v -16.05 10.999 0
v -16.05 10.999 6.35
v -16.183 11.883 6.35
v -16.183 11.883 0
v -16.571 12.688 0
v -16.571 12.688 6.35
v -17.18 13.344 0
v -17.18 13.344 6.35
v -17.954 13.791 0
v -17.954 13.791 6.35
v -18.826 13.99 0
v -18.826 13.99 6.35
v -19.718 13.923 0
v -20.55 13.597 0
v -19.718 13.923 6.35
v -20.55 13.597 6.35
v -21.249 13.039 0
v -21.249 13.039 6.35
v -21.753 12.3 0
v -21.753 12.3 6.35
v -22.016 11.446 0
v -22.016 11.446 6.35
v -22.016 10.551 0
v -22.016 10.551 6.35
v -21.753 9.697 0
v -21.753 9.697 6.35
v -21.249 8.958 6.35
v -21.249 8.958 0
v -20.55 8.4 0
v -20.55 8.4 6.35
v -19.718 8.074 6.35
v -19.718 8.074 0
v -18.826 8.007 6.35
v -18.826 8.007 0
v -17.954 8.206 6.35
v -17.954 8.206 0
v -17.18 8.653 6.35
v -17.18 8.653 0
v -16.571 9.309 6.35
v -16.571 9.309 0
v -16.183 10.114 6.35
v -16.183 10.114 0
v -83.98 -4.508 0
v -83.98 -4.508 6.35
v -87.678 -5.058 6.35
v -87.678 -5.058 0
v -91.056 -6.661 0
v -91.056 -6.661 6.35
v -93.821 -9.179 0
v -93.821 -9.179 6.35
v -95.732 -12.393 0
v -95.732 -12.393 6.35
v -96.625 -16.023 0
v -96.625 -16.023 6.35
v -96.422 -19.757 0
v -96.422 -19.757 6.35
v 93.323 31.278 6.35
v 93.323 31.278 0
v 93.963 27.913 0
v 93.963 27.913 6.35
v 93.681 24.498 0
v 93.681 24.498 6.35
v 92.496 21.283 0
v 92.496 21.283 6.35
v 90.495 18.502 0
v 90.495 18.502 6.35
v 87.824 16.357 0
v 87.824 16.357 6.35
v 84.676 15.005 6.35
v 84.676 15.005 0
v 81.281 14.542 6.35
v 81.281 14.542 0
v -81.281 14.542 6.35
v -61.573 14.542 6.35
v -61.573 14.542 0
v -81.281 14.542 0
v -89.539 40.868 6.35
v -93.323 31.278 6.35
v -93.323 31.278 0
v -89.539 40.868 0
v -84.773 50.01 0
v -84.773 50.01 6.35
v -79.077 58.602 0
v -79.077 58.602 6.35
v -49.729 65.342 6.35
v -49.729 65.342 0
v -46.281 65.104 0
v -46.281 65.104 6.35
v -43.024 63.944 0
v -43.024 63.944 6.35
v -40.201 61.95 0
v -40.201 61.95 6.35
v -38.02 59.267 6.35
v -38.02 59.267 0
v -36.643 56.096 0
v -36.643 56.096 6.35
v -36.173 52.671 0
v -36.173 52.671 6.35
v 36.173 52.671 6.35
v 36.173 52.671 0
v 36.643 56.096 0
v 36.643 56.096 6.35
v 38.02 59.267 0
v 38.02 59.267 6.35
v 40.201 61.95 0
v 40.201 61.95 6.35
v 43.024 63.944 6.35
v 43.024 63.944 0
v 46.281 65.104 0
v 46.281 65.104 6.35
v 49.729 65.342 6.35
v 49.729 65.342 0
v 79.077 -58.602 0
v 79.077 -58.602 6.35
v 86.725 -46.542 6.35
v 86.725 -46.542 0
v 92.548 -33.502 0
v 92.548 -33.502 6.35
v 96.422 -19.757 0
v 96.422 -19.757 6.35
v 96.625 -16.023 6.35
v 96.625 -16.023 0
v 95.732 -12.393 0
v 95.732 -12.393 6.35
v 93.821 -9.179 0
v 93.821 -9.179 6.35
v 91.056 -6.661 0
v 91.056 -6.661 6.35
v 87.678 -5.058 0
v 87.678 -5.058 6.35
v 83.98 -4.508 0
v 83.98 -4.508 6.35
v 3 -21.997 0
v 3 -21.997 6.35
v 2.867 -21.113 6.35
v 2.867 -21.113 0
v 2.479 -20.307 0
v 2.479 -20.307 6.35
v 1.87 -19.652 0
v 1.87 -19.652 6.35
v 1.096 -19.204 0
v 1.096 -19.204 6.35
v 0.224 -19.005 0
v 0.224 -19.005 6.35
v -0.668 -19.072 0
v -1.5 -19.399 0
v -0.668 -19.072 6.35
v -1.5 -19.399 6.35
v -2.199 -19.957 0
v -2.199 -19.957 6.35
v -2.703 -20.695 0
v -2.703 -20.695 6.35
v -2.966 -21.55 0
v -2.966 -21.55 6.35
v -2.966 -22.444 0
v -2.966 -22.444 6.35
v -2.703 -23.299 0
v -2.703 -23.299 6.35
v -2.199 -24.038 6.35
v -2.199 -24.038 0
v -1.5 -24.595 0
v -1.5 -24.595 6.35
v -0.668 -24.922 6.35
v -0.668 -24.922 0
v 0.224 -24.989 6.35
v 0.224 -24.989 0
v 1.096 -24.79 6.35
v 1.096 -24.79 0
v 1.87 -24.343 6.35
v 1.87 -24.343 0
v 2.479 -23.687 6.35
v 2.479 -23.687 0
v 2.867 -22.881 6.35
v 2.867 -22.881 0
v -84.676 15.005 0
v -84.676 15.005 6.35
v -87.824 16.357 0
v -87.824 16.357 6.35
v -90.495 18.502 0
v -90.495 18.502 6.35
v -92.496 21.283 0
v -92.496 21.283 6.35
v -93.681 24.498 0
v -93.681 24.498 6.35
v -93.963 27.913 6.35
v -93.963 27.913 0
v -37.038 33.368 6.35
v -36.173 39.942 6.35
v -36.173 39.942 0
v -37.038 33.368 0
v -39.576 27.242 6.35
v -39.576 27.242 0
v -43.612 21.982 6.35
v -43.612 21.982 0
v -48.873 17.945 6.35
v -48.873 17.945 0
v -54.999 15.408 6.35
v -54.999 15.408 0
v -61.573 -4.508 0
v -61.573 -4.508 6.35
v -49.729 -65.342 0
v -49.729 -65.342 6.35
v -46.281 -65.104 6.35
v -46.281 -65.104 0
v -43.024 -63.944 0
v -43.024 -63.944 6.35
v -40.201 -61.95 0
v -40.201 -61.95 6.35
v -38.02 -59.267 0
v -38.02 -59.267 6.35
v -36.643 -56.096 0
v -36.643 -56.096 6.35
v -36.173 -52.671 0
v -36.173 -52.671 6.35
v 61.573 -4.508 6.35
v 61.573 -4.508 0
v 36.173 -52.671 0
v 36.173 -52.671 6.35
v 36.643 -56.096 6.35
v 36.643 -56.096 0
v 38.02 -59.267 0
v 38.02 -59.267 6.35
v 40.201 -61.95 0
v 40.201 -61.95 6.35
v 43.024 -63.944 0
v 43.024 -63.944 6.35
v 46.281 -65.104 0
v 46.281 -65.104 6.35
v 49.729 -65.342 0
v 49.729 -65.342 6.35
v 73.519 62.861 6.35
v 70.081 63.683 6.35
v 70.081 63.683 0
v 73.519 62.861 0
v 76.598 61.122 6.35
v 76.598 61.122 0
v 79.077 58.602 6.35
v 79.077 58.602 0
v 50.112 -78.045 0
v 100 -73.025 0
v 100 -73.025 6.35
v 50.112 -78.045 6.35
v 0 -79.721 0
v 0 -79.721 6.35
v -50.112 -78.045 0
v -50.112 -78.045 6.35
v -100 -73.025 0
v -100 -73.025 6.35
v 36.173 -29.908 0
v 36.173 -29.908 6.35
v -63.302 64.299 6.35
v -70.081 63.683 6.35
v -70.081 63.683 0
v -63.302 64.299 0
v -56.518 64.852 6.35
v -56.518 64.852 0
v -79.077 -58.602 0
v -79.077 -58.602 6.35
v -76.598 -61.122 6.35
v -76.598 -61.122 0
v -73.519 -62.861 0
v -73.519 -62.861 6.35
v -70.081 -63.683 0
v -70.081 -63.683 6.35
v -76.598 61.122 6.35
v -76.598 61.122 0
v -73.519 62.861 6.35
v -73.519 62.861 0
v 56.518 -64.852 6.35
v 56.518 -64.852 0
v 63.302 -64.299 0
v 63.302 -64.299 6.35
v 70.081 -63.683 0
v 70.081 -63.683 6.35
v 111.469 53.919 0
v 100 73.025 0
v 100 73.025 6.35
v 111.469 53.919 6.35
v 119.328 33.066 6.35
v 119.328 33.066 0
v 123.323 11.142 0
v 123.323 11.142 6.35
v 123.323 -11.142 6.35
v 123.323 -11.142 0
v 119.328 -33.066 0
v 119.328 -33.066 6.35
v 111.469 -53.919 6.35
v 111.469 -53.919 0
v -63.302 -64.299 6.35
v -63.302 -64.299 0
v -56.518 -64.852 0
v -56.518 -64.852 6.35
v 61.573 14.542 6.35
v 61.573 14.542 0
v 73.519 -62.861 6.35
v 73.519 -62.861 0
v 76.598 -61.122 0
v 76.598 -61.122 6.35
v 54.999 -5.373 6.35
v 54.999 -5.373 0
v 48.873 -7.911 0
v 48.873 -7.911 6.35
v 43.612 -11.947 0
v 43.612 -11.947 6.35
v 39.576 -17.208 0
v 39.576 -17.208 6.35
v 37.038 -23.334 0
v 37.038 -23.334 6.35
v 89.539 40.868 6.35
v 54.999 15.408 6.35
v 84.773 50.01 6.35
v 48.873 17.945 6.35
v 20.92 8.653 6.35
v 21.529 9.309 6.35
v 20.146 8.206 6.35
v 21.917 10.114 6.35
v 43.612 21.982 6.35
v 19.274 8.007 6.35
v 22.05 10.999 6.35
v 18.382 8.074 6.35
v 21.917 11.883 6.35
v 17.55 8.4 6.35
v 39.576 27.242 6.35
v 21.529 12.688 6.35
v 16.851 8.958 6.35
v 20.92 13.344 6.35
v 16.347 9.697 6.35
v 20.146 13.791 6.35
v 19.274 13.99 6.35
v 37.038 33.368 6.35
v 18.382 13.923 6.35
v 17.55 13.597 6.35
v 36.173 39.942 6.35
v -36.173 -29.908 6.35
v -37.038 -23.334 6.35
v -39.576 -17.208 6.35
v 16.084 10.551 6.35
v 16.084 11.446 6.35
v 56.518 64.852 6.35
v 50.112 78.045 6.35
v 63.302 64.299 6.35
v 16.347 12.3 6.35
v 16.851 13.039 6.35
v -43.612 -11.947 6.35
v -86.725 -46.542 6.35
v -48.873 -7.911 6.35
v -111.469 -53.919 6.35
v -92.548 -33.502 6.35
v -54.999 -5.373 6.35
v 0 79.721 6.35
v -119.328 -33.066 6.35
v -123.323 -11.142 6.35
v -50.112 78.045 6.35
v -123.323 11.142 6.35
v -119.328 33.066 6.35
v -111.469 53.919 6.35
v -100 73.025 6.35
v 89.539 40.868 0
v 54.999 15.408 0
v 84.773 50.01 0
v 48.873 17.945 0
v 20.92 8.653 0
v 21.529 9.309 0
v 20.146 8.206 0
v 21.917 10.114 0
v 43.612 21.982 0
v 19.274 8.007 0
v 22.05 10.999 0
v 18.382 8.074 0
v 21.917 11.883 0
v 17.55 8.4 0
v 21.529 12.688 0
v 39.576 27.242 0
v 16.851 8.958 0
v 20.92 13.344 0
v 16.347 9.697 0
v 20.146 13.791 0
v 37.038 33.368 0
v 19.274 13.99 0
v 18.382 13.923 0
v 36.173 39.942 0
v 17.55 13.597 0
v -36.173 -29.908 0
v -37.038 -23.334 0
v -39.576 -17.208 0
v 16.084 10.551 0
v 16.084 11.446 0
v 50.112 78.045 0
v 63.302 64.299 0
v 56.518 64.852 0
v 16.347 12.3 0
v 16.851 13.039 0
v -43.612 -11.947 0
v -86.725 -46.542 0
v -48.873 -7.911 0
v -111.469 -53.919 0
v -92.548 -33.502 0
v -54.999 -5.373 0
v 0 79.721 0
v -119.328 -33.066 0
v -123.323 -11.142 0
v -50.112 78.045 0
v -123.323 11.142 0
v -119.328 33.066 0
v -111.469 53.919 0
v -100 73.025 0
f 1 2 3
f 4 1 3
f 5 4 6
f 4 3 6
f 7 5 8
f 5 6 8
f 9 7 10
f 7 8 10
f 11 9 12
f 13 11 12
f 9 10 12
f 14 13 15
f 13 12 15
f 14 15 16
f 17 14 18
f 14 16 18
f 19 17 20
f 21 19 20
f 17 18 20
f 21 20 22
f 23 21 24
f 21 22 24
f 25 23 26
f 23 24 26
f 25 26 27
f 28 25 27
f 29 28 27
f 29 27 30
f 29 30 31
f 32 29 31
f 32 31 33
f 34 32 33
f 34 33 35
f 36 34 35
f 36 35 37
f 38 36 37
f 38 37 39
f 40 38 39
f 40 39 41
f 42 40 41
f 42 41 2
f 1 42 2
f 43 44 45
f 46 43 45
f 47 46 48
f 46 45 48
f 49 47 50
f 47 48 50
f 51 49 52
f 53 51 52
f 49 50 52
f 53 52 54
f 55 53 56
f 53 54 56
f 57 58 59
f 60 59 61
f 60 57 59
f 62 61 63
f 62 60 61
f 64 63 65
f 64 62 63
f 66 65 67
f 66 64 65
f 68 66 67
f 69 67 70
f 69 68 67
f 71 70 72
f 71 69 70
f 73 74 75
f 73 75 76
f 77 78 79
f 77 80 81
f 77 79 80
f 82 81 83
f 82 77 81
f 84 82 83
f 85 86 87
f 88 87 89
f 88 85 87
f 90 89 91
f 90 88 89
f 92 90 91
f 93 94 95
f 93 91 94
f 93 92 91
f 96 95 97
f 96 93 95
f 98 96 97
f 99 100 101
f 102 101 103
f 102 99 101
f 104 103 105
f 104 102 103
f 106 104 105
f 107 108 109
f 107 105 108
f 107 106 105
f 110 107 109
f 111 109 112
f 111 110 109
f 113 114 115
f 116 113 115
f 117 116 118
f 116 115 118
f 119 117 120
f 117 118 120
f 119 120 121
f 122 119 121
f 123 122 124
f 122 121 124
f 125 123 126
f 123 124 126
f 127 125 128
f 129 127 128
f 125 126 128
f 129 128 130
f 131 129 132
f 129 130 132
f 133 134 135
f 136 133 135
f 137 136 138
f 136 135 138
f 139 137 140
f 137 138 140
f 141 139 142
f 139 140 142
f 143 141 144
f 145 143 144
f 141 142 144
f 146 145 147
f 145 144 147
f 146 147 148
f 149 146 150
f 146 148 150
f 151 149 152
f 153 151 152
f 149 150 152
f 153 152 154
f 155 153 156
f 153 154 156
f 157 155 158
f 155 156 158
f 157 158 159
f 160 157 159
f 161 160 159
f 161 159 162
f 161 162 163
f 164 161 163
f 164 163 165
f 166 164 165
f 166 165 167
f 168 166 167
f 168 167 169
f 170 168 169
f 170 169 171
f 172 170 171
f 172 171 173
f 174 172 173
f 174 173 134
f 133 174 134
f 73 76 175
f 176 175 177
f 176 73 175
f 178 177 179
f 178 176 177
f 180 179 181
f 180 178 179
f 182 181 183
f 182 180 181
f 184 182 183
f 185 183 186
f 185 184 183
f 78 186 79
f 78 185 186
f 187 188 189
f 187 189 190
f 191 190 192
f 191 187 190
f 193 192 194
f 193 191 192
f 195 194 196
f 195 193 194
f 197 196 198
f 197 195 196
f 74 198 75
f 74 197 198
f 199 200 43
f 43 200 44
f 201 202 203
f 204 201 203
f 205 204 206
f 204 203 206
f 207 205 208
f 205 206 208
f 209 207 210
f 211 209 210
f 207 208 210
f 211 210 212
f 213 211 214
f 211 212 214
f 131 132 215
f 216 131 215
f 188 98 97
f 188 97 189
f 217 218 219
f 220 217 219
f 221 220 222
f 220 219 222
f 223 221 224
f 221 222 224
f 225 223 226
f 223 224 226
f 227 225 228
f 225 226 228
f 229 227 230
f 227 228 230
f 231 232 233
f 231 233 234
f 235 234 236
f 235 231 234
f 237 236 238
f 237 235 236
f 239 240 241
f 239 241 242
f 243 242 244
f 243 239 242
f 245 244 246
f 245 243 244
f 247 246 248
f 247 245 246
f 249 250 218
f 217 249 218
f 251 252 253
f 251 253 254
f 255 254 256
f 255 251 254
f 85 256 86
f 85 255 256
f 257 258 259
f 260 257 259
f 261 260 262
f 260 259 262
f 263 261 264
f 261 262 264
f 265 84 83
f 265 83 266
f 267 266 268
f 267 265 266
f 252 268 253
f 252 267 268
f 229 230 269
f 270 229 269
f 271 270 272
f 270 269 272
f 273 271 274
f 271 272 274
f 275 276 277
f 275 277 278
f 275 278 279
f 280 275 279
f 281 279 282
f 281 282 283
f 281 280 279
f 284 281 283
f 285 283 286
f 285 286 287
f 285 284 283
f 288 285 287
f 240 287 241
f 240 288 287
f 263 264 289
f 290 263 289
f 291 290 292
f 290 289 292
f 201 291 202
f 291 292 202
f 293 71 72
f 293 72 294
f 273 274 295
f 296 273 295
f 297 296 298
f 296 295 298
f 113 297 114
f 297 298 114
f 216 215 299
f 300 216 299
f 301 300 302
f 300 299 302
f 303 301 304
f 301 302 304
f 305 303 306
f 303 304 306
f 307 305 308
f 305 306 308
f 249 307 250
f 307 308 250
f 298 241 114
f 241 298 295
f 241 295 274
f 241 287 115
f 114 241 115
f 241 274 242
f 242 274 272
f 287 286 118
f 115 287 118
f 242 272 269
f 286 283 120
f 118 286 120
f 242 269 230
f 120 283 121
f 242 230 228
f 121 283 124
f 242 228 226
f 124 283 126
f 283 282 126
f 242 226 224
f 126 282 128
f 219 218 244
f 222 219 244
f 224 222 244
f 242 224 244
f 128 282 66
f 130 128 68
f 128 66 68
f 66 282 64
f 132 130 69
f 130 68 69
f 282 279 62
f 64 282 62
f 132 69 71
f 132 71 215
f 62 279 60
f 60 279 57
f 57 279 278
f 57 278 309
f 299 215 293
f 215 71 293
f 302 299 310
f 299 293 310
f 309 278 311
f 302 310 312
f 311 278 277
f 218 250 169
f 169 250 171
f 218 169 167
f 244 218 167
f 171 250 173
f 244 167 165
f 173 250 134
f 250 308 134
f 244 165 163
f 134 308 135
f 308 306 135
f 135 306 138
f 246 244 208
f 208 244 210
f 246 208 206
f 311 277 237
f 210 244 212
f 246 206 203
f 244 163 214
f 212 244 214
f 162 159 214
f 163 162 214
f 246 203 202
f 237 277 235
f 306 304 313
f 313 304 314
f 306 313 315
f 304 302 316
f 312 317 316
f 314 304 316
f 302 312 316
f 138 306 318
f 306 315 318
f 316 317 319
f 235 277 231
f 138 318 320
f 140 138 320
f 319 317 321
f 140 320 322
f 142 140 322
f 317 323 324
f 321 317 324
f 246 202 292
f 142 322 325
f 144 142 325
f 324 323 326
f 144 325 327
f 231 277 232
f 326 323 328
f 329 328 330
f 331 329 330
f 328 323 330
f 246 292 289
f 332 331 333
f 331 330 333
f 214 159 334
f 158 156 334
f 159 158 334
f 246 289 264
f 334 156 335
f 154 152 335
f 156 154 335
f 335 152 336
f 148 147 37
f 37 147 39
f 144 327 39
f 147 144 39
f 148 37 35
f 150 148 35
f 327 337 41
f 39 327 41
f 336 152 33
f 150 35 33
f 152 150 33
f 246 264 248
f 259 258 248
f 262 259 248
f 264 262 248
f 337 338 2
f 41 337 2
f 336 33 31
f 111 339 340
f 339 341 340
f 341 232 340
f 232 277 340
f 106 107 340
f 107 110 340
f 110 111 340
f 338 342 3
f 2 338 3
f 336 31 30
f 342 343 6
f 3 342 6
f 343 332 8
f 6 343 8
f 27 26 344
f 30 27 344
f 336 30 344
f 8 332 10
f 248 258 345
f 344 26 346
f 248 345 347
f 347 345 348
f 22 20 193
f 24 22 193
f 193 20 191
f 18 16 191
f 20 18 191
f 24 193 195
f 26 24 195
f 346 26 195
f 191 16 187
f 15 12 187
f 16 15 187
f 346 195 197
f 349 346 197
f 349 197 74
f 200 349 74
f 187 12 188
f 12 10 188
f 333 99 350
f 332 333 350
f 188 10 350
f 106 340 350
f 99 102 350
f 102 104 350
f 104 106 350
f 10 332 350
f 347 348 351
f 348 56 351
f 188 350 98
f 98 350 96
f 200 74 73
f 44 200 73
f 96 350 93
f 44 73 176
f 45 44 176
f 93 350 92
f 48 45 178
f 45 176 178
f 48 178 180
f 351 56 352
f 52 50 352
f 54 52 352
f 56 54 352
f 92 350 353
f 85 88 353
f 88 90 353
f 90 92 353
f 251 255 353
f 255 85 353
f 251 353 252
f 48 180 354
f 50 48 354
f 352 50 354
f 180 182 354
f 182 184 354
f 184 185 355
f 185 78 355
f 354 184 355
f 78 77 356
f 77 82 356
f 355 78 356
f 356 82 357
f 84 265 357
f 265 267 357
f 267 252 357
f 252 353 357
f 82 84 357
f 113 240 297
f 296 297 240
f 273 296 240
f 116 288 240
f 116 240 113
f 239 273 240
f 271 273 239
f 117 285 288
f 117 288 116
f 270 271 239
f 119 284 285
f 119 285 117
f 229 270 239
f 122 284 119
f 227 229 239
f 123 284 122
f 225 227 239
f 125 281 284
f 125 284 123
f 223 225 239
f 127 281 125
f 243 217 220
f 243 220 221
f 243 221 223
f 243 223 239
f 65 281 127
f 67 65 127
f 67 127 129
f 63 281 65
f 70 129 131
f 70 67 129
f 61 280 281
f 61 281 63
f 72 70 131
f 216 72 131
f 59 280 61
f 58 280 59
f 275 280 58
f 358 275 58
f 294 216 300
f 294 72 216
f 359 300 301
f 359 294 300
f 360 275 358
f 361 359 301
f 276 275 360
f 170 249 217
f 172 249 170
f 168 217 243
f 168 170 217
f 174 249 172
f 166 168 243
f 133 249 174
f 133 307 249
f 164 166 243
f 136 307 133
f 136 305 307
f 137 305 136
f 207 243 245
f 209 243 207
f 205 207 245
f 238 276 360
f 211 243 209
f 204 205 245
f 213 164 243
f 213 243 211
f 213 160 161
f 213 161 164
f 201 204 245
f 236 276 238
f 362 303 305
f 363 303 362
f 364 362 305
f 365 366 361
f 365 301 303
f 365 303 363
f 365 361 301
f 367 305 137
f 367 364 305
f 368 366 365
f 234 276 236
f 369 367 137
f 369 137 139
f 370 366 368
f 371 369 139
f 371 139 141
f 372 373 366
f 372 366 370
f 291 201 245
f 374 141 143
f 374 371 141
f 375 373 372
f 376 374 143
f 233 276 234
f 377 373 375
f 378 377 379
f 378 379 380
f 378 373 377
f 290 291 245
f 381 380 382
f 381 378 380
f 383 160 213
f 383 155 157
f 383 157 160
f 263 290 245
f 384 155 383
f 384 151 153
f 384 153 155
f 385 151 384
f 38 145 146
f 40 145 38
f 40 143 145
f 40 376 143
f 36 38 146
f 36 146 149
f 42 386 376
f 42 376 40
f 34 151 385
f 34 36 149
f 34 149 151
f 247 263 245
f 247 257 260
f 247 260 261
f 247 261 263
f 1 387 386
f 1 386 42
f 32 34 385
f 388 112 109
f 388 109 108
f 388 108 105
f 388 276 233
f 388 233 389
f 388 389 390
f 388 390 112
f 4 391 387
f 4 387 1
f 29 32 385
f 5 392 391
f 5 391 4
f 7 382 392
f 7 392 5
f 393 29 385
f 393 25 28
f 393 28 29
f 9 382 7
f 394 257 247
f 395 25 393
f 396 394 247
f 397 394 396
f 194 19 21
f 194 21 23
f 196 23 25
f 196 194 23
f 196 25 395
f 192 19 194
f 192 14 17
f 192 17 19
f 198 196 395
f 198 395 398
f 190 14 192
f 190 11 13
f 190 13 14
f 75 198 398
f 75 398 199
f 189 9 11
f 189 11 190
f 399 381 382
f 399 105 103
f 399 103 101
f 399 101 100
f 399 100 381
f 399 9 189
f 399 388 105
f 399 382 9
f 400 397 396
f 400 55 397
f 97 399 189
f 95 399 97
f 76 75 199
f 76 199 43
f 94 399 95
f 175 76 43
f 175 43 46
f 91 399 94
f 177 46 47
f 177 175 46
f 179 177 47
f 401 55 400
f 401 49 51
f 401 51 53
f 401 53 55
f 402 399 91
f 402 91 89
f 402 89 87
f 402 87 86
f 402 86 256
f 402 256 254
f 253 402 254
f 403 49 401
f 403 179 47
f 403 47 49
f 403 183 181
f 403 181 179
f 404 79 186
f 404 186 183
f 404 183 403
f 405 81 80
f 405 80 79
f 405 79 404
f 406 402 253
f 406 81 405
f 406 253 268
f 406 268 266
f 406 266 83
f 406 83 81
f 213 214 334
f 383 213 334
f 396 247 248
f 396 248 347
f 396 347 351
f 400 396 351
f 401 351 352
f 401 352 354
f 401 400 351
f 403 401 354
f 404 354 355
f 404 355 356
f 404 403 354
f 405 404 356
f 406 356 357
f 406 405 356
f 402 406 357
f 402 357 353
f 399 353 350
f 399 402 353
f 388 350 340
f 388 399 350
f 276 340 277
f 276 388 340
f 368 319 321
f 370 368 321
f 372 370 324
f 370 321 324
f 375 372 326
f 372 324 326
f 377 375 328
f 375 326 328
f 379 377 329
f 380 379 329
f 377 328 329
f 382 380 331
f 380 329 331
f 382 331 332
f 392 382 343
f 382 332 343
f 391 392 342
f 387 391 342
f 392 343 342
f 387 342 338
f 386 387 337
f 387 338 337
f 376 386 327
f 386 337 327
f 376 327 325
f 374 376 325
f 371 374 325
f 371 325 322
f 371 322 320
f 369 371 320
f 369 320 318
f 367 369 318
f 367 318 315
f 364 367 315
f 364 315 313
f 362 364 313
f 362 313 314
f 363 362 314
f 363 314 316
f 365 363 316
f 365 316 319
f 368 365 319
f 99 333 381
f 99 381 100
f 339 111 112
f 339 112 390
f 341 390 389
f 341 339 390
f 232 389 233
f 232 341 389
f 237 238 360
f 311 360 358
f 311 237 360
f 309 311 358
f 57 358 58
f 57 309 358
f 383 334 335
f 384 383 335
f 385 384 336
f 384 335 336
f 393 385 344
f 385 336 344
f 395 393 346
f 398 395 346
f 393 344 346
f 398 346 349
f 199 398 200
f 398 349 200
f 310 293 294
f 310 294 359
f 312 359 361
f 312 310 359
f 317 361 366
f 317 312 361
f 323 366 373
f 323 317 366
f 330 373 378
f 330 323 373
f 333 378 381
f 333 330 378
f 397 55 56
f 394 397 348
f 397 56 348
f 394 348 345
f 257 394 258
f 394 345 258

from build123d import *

# Parameters (mm, degrees)
BOSS_EXTRUDE1_DEPTH = 6.35
CUT_EXTRUDE1_DEPTH  = 7.35
SKETCH4_R           = 3
CUT_EXTRUDE2_DEPTH  = 7.35


with BuildPart() as part:
    # Sketch2 → Boss-Extrude1 (new body)
    with BuildSketch(Plane.XY):
        with BuildLine():
            ThreePointArc((-100, 73.02486306), (0, 79.721425695), (100, 73.02486306))
            ThreePointArc((100, 73.02486306), (123.825, 0), (100, -73.02486306))
            ThreePointArc((100, -73.02486306), (0, -79.721425695), (-100, -73.02486306))
            ThreePointArc((-100, -73.02486306), (-123.825, 0), (-100, 73.02486306))
        make_face()
    extrude(amount=BOSS_EXTRUDE1_DEPTH)

    # Sketch3 → Cut-Extrude1 (cut, through all)
    with BuildSketch(Plane.XY.offset(6.35)):
        with BuildLine():
            Line((-61.572799723, 14.542440806), (-81.281148146, 14.542440806))
            ThreePointArc((-81.281148146, 14.542440806), (-91.5900314, 19.825101253), (-93.322799723, 31.278357963))
            ThreePointArc((-93.322799723, 31.278357963), (-87.27608067, 45.501278749), (-79.077484693, 58.602321112))
            ThreePointArc((-79.077484693, 58.602321112), (-75.119328128, 62.098990903), (-70.081085695, 63.683230851))
            ThreePointArc((-70.081085695, 63.683230851), (-59.910981492, 64.583293189), (-49.729388954, 65.342440806))
            ThreePointArc((-49.729388954, 65.342440806), (-40.200680121, 61.949526114), (-36.172799723, 52.671361338))
            Line((-36.172799723, 52.671361338), (-36.172799723, 39.942440806))
            ThreePointArc((-36.172799723, 39.942440806), (-43.612287481, 21.981928564), (-61.572799723, 14.542440806))
        make_face()
        with BuildLine():
            Line((36.172799723, -29.907559194), (36.172799723, -52.671361338))
            ThreePointArc((36.172799723, -52.671361338), (40.200680121, -61.949526114), (49.729388954, -65.342440806))
            ThreePointArc((49.729388954, -65.342440806), (59.910981492, -64.583293189), (70.081085695, -63.683230851))
            ThreePointArc((70.081085695, -63.683230851), (75.119328128, -62.098990903), (79.077484693, -58.602321112))
            ThreePointArc((79.077484693, -58.602321112), (89.8734441, -40.12785405), (96.421721635, -19.756827222))
            ThreePointArc((96.421721635, -19.756827222), (93.820577654, -9.179038283), (83.980209166, -4.507559194))
            Line((83.980209166, -4.507559194), (61.572799723, -4.507559194))
            ThreePointArc((61.572799723, -4.507559194), (43.612287481, -11.947046951), (36.172799723, -29.907559194))
        make_face()
        with BuildLine():
            Line((-61.572799723, -4.507559194), (-83.980209166, -4.507559194))
            ThreePointArc((-83.980209166, -4.507559194), (-93.820577654, -9.179038283), (-96.421721635, -19.756827222))
            ThreePointArc((-96.421721635, -19.756827222), (-89.8734441, -40.12785405), (-79.077484693, -58.602321112))
            ThreePointArc((-79.077484693, -58.602321112), (-75.119328128, -62.098990903), (-70.081085695, -63.683230851))
            ThreePointArc((-70.081085695, -63.683230851), (-59.910981492, -64.583293189), (-49.729388954, -65.342440806))
            ThreePointArc((-49.729388954, -65.342440806), (-40.200680121, -61.949526114), (-36.172799723, -52.671361338))
            Line((-36.172799723, -52.671361338), (-36.172799723, -29.907559194))
            ThreePointArc((-36.172799723, -29.907559194), (-43.612287481, -11.947046951), (-61.572799723, -4.507559194))
        make_face()
        with BuildLine():
            Line((36.172799723, 39.942440806), (36.172799723, 52.671361338))
            ThreePointArc((36.172799723, 52.671361338), (40.200680121, 61.949526114), (49.729388954, 65.342440806))
            ThreePointArc((49.729388954, 65.342440806), (59.910981492, 64.583293189), (70.081085695, 63.683230851))
            ThreePointArc((70.081085695, 63.683230851), (75.119328128, 62.098990903), (79.077484693, 58.602321112))
            ThreePointArc((79.077484693, 58.602321112), (87.27608067, 45.501278749), (93.322799723, 31.278357963))
            ThreePointArc((93.322799723, 31.278357963), (91.5900314, 19.825101253), (81.281148146, 14.542440806))
            Line((81.281148146, 14.542440806), (61.572799723, 14.542440806))
            ThreePointArc((61.572799723, 14.542440806), (43.612287481, 21.981928564), (36.172799723, 39.942440806))
        make_face()
    extrude(amount=-CUT_EXTRUDE1_DEPTH, mode=Mode.SUBTRACT)

    # Sketch4 → Cut-Extrude2 (cut, through all)
    with BuildSketch(Plane.XY.offset(6.35)):
        with Locations((-19.05, 10.998522628)):
            Circle(SKETCH4_R)
        with Locations((19.05, 10.998522628)):
            Circle(SKETCH4_R)
        with Locations((0, -21.997045256)):
            Circle(SKETCH4_R)
    extrude(amount=-CUT_EXTRUDE2_DEPTH, mode=Mode.SUBTRACT)


solid = part.part
